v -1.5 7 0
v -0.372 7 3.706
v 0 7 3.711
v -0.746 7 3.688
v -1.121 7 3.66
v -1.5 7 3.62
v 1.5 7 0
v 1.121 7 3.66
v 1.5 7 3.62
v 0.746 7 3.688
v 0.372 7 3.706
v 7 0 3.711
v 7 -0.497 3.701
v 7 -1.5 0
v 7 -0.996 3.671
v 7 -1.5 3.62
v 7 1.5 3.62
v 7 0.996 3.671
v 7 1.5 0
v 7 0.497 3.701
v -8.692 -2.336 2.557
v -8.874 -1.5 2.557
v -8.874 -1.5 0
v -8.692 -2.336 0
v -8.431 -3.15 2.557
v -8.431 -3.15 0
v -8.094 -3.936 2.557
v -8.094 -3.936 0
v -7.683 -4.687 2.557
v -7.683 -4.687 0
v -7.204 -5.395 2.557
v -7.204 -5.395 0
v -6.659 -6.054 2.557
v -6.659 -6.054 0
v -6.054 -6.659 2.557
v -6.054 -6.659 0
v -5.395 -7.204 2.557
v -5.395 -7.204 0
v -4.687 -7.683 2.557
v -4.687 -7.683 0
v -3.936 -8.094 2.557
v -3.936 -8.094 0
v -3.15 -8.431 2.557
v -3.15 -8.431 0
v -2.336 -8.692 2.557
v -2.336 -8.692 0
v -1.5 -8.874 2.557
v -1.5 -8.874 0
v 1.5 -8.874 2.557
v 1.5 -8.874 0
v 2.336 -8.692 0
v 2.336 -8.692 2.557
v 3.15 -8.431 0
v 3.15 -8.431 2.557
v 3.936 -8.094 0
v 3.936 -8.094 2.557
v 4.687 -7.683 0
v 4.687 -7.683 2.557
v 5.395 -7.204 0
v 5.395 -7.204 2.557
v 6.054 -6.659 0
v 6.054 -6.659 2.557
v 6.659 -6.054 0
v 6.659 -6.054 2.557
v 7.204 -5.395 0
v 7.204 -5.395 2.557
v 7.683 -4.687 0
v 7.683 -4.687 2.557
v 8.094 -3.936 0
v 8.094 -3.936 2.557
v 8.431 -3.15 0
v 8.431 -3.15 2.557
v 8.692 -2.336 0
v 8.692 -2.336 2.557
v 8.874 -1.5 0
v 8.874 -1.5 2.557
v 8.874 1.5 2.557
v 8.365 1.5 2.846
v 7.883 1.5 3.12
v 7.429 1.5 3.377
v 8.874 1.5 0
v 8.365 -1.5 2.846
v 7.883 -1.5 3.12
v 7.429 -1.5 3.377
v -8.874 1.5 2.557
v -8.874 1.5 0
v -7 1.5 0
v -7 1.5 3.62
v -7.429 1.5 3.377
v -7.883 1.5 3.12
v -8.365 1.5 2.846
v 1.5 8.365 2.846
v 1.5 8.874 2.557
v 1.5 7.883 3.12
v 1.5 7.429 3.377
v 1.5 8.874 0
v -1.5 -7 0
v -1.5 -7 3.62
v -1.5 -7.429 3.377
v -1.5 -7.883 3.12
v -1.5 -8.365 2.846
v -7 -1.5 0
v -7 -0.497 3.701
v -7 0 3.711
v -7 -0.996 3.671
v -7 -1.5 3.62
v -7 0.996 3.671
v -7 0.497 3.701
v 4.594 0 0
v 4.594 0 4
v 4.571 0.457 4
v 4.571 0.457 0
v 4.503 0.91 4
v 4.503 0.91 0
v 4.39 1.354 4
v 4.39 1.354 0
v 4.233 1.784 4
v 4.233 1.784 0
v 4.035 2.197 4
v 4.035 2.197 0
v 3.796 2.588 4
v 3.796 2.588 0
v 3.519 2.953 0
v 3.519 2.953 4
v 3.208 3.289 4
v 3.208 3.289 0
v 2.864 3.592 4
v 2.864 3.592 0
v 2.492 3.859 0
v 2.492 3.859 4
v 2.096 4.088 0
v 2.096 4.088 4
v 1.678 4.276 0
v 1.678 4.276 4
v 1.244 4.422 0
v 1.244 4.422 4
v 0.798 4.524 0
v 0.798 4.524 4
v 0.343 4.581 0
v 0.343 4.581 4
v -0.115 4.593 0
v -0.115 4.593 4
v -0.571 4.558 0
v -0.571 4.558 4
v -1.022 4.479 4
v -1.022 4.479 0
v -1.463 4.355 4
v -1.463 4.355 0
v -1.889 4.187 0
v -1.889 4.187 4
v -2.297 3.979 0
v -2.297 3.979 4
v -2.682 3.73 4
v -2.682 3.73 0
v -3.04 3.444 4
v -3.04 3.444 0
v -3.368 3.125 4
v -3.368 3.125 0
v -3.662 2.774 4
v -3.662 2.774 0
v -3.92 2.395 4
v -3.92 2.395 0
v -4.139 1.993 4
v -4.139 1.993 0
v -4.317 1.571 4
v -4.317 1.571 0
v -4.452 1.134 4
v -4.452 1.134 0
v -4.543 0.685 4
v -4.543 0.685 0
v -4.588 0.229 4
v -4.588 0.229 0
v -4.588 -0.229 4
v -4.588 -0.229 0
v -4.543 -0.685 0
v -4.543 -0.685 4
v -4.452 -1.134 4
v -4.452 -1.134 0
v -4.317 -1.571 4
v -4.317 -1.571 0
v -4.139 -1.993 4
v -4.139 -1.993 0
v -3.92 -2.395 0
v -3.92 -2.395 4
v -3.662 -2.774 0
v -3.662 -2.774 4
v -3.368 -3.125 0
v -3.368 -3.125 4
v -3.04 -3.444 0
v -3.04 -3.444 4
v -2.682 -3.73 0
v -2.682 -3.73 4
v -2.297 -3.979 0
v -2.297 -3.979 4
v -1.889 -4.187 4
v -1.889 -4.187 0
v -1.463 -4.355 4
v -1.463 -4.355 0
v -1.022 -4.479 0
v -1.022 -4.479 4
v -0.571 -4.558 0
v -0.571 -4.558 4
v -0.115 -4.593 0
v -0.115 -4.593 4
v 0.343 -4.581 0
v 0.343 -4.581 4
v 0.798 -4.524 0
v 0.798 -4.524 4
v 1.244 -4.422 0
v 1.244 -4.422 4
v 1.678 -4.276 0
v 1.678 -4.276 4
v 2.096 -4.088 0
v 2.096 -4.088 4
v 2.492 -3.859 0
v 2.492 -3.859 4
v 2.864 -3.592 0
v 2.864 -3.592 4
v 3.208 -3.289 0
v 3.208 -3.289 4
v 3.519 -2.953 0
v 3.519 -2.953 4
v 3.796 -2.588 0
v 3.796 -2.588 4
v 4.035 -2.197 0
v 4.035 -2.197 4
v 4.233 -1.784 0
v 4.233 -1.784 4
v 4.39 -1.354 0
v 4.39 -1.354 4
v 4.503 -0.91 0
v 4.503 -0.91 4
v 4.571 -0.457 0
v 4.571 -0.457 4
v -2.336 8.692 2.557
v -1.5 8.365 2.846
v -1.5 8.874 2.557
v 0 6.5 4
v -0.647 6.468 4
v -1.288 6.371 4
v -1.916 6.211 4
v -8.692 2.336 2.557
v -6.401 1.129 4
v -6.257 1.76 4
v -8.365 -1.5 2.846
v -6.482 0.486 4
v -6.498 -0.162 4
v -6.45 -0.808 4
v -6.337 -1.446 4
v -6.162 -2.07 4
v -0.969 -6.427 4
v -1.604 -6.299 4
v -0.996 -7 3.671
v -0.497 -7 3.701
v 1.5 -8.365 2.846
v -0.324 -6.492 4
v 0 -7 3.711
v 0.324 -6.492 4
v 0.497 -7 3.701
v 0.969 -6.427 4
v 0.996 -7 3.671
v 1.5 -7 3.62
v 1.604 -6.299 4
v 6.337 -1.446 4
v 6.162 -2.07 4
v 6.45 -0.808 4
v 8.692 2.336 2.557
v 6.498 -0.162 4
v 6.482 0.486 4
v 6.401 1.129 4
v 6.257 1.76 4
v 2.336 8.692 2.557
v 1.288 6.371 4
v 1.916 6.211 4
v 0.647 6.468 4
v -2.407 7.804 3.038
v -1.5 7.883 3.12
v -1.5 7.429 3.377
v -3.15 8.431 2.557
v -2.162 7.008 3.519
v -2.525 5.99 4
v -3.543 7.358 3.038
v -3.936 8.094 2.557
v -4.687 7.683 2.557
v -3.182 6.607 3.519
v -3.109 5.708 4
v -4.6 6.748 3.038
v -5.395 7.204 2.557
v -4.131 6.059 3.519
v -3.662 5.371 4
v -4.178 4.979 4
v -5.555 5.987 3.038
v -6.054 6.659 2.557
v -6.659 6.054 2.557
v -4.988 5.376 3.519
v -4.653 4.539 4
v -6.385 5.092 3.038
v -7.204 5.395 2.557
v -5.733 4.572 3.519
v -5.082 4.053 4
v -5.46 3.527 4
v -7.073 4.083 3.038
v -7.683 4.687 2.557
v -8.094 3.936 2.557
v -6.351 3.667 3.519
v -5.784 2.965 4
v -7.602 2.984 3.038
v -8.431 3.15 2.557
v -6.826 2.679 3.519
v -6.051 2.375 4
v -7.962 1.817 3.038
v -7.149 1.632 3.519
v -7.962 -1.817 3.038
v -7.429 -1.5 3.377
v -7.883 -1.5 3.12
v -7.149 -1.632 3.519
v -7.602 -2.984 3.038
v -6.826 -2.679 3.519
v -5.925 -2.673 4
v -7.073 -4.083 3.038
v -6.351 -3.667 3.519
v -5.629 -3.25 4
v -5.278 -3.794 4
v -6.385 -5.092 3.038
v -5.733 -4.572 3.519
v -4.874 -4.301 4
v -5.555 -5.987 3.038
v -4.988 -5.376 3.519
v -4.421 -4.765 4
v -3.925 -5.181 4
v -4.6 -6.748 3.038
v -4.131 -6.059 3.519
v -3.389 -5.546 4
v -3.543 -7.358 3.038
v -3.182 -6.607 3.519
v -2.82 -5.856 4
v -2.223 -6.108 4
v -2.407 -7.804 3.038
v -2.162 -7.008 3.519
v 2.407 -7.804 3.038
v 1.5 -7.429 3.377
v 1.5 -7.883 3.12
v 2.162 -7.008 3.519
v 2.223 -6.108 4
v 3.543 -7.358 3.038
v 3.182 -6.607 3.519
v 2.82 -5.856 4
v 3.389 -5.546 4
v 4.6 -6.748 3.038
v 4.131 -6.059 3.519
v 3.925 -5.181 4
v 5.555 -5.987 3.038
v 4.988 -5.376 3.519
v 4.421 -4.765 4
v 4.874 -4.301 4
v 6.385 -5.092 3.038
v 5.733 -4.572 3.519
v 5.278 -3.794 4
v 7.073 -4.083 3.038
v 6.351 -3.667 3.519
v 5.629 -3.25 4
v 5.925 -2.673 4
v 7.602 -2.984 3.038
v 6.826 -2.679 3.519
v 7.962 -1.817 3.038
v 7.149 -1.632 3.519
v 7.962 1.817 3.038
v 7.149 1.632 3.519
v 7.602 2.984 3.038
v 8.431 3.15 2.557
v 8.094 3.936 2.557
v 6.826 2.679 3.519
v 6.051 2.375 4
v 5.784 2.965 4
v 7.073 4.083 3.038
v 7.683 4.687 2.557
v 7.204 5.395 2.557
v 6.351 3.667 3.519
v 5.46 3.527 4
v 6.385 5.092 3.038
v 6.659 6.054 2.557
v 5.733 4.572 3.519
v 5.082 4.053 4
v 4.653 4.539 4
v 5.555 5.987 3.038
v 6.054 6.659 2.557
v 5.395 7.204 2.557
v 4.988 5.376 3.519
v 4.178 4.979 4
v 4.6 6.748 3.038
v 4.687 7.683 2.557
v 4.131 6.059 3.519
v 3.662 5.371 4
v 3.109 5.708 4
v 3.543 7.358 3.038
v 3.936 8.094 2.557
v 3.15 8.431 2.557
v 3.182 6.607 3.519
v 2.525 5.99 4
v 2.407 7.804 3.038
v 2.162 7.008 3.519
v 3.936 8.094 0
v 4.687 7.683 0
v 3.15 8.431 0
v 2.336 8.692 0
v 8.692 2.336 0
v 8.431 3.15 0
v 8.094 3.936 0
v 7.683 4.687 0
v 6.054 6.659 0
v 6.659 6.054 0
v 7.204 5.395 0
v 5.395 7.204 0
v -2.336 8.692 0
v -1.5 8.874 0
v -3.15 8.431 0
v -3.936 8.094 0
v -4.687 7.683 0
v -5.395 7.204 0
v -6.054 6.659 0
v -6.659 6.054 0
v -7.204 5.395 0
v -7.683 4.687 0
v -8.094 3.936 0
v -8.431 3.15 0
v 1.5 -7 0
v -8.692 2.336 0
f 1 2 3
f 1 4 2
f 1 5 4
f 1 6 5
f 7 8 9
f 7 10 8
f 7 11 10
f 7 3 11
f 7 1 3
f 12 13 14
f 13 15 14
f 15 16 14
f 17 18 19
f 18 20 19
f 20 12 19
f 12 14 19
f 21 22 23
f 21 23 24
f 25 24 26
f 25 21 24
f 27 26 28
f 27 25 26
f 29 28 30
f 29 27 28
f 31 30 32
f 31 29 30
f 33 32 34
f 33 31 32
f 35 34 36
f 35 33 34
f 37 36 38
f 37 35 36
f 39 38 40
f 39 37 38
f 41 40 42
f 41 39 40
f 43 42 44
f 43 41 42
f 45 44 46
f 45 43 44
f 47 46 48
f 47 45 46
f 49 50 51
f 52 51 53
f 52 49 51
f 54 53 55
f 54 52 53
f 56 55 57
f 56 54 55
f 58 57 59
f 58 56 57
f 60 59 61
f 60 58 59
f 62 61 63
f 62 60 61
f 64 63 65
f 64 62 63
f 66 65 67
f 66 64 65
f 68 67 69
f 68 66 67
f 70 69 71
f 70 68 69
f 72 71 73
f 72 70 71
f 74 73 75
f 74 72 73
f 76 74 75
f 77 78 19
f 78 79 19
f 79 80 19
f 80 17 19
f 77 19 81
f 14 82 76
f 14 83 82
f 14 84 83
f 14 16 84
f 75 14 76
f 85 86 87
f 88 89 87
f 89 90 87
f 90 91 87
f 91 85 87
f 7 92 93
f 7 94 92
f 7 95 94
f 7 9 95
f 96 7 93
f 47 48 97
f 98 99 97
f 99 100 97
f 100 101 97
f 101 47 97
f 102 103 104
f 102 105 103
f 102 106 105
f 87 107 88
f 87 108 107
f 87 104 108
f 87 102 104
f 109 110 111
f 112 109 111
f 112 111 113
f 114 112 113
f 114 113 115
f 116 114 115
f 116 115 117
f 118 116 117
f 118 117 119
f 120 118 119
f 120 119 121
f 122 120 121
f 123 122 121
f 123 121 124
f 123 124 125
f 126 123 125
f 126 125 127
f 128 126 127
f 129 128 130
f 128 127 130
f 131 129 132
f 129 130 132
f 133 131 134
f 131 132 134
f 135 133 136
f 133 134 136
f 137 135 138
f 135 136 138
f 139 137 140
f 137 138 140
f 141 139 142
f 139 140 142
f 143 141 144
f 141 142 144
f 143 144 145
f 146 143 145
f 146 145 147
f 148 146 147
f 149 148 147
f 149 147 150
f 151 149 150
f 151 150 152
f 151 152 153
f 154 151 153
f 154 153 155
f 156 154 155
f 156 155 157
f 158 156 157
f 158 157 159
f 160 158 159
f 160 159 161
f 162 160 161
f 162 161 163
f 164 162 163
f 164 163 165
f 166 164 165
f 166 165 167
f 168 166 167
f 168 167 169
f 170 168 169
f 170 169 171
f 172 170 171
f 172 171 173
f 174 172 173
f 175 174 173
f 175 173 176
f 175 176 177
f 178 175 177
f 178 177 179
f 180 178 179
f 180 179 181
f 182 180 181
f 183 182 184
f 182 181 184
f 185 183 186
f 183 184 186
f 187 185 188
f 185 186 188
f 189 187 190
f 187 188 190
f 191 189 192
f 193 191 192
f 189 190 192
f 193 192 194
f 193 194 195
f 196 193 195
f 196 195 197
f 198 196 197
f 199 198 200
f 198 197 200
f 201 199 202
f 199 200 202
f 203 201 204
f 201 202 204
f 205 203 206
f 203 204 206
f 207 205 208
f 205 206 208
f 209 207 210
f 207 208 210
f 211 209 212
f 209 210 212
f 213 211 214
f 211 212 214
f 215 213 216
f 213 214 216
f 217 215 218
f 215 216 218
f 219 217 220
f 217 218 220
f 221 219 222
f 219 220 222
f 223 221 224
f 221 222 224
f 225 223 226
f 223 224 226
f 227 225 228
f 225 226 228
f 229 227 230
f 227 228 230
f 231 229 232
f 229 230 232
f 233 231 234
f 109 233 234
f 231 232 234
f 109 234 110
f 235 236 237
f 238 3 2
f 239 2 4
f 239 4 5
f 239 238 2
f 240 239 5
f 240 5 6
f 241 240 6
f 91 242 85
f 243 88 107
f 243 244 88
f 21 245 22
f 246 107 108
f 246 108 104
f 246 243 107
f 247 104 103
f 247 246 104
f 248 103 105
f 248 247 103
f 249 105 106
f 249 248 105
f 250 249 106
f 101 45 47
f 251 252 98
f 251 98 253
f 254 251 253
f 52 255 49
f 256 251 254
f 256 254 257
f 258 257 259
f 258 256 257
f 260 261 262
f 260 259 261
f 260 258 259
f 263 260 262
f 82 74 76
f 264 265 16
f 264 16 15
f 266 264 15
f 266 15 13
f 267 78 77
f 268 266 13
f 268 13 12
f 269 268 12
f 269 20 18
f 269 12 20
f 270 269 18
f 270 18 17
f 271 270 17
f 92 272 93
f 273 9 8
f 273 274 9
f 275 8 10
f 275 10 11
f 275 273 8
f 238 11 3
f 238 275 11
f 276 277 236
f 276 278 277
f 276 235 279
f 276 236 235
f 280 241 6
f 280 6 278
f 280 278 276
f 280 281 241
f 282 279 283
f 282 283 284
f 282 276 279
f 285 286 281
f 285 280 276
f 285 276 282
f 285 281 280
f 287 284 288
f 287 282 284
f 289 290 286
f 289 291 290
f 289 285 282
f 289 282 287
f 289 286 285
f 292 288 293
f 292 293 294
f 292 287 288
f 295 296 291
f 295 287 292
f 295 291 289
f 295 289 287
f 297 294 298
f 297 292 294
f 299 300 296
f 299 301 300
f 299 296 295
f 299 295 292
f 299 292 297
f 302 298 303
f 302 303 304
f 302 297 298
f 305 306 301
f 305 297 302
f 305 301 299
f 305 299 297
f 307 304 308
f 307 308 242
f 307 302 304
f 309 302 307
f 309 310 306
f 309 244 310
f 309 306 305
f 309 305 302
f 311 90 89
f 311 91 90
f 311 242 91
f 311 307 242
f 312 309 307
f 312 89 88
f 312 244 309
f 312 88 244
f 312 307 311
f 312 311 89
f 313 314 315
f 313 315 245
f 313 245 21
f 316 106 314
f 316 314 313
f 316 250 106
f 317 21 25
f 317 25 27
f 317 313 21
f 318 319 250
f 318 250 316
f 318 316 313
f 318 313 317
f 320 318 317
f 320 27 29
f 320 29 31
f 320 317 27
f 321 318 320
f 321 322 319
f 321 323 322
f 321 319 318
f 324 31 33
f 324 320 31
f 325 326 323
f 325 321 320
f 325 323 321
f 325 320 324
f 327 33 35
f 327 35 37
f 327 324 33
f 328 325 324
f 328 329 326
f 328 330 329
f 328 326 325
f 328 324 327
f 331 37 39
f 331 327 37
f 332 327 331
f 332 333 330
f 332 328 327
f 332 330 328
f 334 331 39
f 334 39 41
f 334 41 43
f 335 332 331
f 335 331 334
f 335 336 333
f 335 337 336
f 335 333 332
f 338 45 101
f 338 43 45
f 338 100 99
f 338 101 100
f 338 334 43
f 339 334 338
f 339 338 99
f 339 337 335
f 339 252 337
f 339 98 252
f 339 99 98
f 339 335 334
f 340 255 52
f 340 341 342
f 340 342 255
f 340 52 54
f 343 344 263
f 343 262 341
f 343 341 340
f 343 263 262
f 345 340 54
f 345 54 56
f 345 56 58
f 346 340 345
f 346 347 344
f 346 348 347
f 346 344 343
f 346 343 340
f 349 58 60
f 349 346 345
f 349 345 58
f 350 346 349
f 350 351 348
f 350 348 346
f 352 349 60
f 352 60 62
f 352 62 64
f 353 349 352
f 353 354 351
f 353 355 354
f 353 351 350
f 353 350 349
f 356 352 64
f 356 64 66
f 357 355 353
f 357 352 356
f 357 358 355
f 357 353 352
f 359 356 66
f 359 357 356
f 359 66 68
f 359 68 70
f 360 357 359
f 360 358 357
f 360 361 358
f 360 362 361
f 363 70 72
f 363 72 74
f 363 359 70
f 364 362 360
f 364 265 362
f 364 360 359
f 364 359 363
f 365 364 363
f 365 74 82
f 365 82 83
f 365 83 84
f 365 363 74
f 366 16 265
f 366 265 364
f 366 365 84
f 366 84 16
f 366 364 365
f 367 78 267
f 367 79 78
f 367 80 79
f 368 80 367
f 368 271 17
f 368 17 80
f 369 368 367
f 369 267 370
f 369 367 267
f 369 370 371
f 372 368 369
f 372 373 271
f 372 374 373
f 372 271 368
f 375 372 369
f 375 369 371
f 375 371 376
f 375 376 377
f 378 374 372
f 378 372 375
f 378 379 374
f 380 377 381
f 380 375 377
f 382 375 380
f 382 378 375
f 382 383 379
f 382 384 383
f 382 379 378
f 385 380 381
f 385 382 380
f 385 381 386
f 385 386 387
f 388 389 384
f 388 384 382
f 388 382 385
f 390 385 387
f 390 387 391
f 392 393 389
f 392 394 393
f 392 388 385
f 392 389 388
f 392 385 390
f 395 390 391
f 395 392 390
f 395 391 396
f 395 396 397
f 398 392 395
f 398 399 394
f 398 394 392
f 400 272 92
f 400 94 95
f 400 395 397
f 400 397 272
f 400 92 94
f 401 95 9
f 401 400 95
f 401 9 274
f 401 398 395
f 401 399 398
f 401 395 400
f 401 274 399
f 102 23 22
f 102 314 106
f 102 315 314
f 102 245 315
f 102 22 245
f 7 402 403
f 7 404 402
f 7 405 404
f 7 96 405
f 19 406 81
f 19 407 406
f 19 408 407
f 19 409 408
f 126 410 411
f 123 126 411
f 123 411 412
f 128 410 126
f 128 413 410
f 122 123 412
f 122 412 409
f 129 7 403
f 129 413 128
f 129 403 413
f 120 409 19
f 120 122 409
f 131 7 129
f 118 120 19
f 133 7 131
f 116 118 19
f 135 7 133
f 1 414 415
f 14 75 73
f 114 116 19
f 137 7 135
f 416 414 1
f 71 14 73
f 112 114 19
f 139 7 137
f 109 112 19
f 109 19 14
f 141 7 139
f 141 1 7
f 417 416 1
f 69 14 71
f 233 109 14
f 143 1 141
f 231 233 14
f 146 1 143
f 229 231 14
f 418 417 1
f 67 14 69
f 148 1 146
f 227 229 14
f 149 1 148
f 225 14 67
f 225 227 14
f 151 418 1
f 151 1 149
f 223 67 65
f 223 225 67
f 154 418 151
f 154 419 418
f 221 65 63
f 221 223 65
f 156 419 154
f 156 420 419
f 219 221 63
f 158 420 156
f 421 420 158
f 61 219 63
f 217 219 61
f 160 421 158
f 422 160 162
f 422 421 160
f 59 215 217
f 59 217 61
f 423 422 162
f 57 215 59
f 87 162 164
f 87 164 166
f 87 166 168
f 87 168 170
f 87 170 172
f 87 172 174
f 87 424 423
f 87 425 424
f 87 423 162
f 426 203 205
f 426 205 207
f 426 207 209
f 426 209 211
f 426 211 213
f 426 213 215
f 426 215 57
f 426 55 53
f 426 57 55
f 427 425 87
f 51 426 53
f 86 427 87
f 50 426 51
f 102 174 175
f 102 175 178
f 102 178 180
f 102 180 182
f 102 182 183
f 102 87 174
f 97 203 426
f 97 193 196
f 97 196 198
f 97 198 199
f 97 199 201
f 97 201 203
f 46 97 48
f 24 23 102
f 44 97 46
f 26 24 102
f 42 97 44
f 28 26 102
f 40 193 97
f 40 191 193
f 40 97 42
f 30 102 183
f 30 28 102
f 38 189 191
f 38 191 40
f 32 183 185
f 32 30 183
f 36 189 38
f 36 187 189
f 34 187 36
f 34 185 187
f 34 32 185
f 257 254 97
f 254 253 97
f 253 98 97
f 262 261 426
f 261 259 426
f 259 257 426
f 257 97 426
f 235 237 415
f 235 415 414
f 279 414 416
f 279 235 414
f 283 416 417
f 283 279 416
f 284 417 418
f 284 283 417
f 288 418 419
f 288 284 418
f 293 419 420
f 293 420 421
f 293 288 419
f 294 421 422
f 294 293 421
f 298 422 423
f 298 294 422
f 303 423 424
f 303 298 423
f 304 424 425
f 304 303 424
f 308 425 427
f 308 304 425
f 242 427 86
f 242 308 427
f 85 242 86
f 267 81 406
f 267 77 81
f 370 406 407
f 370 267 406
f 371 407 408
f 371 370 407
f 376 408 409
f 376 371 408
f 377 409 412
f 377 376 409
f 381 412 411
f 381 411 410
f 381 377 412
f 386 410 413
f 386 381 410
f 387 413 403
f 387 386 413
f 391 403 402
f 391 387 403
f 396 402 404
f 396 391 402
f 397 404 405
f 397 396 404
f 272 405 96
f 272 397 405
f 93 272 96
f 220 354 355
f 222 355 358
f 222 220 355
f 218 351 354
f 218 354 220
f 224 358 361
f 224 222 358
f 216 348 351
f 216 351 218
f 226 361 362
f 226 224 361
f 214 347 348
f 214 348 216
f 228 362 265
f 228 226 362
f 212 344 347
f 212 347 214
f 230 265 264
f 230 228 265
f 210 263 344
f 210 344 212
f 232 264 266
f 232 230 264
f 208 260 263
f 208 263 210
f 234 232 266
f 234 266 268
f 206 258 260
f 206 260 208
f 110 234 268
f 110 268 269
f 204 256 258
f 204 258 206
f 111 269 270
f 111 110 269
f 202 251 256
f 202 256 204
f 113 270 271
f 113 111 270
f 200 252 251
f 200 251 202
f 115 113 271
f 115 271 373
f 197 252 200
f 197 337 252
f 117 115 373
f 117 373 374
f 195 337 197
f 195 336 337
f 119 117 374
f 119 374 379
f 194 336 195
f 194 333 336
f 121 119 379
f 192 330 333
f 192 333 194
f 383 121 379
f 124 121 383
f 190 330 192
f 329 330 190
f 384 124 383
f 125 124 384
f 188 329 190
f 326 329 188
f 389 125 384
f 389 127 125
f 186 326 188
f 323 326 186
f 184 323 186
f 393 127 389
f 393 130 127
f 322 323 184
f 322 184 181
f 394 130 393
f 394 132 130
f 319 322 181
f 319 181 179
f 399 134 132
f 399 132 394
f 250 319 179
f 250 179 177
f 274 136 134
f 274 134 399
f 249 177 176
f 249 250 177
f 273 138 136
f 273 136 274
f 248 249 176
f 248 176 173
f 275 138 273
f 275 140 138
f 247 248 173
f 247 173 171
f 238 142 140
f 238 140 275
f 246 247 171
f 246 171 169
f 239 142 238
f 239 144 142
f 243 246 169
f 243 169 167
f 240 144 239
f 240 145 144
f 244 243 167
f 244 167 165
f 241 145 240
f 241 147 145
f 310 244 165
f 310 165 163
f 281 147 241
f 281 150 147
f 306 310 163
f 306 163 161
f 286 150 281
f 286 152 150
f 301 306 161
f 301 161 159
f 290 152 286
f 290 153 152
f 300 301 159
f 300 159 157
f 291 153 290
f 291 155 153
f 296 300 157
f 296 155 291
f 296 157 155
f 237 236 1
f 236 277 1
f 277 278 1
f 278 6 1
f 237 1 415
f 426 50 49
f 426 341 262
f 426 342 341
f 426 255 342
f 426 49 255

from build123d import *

# Parameters (mm, degrees)
TAP1_D             = 9.188
SKETCH4_W          = 3
SKETCH4_H          = 2
SKETCH4_W_2        = 2
SKETCH4_H_2        = 3
CUT_EXTRUDE1_DEPTH = 14.341664064


with BuildPart() as part:
    # Sketch1 → Revolve1 (revolve)
    with BuildSketch(Plane(origin=(0, 0, 0), x_dir=(0, 0, -1), z_dir=(1, 0, 0))):
        Polygon((0, 9), (-2.556624327, 9), (-4, 6.5), (-4, 0), (0, 0), align=None)
    revolve(axis=Axis((0, 0, 0), (0, 0, 1)))

    # Tap1 (through all)
    with Locations(Plane(origin=(0, 0, 0), x_dir=(-1, 0, 0), z_dir=(0, 0, -1))):
        with Locations((0, 0)):
            Hole(TAP1_D / 2)

    # Sketch4 → Cut-Extrude1 (cut, through all)
    with BuildSketch(Plane.XY):
        with Locations((0, 8)):
            Rectangle(SKETCH4_W, SKETCH4_H)
        with Locations((-8, 0)):
            Rectangle(SKETCH4_W_2, SKETCH4_H_2)
        with Locations((8, 0)):
            Rectangle(SKETCH4_W_2, SKETCH4_H_2)
        with Locations((0, -8)):
            Rectangle(SKETCH4_W, SKETCH4_H)
    extrude(amount=CUT_EXTRUDE1_DEPTH, mode=Mode.SUBTRACT)


solid = part.part
